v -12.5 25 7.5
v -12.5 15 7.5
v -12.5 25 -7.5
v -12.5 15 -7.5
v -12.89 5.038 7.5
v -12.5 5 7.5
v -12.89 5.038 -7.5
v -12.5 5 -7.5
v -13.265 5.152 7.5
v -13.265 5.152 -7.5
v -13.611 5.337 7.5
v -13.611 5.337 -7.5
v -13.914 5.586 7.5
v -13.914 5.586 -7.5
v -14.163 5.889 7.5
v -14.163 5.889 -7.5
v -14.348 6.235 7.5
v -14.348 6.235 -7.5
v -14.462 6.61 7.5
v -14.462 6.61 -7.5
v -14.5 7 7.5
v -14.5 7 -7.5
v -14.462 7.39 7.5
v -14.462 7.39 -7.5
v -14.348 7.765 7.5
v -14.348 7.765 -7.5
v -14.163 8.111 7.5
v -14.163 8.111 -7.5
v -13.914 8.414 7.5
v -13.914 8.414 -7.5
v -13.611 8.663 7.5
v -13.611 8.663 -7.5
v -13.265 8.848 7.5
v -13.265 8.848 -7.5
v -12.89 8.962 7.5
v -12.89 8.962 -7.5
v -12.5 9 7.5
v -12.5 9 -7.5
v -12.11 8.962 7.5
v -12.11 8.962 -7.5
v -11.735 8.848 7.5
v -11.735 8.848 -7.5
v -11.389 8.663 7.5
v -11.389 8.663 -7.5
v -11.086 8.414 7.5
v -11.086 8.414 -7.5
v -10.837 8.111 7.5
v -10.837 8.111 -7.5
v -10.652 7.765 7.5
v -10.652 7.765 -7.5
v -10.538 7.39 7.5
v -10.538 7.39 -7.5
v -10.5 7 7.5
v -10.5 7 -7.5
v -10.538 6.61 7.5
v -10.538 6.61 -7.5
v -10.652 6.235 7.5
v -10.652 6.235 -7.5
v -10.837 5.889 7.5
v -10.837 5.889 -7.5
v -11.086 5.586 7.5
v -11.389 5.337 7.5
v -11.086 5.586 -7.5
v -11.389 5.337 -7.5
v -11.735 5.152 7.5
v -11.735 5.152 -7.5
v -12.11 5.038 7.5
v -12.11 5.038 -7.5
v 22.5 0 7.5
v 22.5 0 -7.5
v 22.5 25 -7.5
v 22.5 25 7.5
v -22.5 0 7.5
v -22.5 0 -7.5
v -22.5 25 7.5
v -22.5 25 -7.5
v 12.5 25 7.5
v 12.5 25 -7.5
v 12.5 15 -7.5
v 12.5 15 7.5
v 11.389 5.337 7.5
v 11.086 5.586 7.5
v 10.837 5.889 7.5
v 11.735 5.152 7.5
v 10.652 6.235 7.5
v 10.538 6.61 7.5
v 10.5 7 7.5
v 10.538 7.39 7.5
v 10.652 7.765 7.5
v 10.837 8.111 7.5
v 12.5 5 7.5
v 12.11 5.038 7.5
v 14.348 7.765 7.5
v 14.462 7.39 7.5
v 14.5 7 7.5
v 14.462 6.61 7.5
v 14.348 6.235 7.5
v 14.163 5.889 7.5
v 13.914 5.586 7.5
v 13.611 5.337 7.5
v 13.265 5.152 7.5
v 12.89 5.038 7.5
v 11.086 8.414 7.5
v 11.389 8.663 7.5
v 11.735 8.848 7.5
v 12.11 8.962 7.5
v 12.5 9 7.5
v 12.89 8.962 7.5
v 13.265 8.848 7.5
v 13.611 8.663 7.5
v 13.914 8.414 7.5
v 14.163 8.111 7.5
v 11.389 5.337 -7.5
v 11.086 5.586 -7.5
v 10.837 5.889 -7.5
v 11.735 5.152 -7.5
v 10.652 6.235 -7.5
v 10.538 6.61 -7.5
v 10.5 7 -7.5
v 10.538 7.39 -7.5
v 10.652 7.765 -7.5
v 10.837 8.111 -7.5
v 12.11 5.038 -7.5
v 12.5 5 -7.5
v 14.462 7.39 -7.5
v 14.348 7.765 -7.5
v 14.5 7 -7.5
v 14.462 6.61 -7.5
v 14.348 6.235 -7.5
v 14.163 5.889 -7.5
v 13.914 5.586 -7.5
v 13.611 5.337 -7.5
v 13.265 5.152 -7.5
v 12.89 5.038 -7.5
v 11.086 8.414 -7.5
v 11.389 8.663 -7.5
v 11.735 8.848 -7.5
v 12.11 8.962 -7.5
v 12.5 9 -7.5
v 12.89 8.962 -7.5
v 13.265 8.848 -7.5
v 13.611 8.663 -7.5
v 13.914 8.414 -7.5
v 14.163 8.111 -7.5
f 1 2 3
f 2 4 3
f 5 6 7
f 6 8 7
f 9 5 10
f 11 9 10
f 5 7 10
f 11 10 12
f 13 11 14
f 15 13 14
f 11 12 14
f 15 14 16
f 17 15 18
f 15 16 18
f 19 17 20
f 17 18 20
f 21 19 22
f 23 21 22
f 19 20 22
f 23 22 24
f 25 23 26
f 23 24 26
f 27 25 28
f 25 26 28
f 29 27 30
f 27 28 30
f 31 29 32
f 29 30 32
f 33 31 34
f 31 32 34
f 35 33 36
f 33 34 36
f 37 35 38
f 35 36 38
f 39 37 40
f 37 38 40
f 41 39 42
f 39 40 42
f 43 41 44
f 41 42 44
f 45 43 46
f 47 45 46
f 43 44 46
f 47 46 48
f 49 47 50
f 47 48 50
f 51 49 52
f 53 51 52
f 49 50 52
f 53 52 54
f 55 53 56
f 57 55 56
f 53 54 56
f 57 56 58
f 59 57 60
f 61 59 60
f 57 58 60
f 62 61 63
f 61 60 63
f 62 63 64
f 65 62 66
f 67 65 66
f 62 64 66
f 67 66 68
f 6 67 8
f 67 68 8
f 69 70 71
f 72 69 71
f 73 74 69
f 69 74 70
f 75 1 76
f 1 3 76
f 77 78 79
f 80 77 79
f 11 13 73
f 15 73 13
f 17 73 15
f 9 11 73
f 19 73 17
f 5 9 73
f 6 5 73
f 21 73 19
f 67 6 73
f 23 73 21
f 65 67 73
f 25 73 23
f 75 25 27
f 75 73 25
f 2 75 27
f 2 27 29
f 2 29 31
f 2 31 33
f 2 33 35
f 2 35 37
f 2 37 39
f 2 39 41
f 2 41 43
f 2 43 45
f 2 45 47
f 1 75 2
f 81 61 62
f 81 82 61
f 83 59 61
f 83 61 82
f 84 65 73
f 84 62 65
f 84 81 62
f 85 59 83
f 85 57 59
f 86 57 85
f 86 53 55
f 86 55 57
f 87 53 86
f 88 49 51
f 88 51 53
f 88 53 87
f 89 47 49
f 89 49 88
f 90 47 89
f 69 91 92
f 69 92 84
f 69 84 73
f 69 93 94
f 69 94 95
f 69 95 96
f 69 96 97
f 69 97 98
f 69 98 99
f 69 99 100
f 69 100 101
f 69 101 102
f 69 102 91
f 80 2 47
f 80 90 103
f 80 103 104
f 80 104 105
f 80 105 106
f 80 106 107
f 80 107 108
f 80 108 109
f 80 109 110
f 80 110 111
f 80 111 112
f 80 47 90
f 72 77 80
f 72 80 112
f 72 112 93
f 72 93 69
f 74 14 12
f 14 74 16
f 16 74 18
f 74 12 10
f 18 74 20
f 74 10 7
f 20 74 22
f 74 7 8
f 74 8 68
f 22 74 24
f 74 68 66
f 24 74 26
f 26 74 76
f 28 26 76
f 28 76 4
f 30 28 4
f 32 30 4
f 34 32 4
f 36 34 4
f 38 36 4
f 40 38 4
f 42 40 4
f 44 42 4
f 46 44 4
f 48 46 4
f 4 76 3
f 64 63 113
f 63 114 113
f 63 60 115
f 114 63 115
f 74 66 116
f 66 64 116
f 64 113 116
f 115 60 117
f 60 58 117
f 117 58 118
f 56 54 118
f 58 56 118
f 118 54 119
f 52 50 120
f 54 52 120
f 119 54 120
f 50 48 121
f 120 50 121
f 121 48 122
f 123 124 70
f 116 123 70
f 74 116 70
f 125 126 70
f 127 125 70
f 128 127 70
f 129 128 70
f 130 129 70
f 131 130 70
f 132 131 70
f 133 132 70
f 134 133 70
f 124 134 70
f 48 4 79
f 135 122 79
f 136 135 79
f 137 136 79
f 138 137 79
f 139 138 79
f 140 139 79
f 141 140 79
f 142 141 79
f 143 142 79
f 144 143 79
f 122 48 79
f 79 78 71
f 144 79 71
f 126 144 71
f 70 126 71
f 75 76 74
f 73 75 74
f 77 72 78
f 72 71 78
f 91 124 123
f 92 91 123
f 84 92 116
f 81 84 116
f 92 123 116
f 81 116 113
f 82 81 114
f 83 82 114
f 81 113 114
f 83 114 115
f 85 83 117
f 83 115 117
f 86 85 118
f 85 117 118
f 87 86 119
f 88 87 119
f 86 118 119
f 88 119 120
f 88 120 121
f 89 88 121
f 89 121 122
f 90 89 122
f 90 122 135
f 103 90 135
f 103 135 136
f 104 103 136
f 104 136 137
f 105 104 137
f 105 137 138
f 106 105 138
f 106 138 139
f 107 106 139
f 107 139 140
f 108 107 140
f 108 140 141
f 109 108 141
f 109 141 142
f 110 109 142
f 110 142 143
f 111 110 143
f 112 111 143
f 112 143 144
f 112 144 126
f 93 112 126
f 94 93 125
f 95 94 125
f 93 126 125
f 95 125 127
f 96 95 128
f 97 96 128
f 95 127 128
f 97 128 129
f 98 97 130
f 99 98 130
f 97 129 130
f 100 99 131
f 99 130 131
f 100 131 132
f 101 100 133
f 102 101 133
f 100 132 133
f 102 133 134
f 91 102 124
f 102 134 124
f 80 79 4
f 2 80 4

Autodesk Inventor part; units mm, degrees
ref_plane "YZ Plane" through (0, 0, 0) normal (1, 0, 0) x (0, 1, 0)
ref_plane "XZ Plane" through (0, 0, 0) normal (0, 1, 0) x (-1, 0, 0)
ref_plane "XY Plane" through (0, 0, 0) normal (0, 0, 1) x (1, 0, 0)
sketch "Sketch1" plane through (0, 0, 0) normal (0, 0, 1) x (1, 0, 0)
  line L0 (-22.5, 0) -> (22.5, 0)
  line L1 (22.5, 0) -> (22.5, 25)
  line L2 (22.5, 25) -> (12.5, 25)
  line L3 (12.5, 25) -> (12.5, 15)
  line L4 (12.5, 15) -> (-12.5, 15)
  line L5 (-12.5, 15) -> (-12.5, 25)
  line L6 (-12.5, 25) -> (-22.5, 25)
  line L7 (-22.5, 25) -> (-22.5, 0)
  point P0 (0, 0)
  point P1 (0, 0)
  dimension "d0" = 45
  dimension "d1" = 25
  dimension "d2" = 10
  dimension "d3" = 10
extrude "Extrusion1" add sketch "Sketch1" along normal mid plane 15
sketch "Sketch3" plane through (0, 0, 7.5) normal (0, 0, 1) x (1, 0, 0)
  line L0 (12.5, 7) -> (-12.5, 7) construction
  line L1 (0, 0) -> (0, 14) construction
  line L2 (12.5, 15) -> (-12.5, 15) projected
  point P0 (0, 7)
  dimension "d14" = 8
  dimension "d15" = 25
hole "Hole2" at (12.5, 7, 7.5) at (-12.5, 7, 7.5) direction (0, 0, -1) diameter 4 end through all
properties part number "sujetador inferior"
